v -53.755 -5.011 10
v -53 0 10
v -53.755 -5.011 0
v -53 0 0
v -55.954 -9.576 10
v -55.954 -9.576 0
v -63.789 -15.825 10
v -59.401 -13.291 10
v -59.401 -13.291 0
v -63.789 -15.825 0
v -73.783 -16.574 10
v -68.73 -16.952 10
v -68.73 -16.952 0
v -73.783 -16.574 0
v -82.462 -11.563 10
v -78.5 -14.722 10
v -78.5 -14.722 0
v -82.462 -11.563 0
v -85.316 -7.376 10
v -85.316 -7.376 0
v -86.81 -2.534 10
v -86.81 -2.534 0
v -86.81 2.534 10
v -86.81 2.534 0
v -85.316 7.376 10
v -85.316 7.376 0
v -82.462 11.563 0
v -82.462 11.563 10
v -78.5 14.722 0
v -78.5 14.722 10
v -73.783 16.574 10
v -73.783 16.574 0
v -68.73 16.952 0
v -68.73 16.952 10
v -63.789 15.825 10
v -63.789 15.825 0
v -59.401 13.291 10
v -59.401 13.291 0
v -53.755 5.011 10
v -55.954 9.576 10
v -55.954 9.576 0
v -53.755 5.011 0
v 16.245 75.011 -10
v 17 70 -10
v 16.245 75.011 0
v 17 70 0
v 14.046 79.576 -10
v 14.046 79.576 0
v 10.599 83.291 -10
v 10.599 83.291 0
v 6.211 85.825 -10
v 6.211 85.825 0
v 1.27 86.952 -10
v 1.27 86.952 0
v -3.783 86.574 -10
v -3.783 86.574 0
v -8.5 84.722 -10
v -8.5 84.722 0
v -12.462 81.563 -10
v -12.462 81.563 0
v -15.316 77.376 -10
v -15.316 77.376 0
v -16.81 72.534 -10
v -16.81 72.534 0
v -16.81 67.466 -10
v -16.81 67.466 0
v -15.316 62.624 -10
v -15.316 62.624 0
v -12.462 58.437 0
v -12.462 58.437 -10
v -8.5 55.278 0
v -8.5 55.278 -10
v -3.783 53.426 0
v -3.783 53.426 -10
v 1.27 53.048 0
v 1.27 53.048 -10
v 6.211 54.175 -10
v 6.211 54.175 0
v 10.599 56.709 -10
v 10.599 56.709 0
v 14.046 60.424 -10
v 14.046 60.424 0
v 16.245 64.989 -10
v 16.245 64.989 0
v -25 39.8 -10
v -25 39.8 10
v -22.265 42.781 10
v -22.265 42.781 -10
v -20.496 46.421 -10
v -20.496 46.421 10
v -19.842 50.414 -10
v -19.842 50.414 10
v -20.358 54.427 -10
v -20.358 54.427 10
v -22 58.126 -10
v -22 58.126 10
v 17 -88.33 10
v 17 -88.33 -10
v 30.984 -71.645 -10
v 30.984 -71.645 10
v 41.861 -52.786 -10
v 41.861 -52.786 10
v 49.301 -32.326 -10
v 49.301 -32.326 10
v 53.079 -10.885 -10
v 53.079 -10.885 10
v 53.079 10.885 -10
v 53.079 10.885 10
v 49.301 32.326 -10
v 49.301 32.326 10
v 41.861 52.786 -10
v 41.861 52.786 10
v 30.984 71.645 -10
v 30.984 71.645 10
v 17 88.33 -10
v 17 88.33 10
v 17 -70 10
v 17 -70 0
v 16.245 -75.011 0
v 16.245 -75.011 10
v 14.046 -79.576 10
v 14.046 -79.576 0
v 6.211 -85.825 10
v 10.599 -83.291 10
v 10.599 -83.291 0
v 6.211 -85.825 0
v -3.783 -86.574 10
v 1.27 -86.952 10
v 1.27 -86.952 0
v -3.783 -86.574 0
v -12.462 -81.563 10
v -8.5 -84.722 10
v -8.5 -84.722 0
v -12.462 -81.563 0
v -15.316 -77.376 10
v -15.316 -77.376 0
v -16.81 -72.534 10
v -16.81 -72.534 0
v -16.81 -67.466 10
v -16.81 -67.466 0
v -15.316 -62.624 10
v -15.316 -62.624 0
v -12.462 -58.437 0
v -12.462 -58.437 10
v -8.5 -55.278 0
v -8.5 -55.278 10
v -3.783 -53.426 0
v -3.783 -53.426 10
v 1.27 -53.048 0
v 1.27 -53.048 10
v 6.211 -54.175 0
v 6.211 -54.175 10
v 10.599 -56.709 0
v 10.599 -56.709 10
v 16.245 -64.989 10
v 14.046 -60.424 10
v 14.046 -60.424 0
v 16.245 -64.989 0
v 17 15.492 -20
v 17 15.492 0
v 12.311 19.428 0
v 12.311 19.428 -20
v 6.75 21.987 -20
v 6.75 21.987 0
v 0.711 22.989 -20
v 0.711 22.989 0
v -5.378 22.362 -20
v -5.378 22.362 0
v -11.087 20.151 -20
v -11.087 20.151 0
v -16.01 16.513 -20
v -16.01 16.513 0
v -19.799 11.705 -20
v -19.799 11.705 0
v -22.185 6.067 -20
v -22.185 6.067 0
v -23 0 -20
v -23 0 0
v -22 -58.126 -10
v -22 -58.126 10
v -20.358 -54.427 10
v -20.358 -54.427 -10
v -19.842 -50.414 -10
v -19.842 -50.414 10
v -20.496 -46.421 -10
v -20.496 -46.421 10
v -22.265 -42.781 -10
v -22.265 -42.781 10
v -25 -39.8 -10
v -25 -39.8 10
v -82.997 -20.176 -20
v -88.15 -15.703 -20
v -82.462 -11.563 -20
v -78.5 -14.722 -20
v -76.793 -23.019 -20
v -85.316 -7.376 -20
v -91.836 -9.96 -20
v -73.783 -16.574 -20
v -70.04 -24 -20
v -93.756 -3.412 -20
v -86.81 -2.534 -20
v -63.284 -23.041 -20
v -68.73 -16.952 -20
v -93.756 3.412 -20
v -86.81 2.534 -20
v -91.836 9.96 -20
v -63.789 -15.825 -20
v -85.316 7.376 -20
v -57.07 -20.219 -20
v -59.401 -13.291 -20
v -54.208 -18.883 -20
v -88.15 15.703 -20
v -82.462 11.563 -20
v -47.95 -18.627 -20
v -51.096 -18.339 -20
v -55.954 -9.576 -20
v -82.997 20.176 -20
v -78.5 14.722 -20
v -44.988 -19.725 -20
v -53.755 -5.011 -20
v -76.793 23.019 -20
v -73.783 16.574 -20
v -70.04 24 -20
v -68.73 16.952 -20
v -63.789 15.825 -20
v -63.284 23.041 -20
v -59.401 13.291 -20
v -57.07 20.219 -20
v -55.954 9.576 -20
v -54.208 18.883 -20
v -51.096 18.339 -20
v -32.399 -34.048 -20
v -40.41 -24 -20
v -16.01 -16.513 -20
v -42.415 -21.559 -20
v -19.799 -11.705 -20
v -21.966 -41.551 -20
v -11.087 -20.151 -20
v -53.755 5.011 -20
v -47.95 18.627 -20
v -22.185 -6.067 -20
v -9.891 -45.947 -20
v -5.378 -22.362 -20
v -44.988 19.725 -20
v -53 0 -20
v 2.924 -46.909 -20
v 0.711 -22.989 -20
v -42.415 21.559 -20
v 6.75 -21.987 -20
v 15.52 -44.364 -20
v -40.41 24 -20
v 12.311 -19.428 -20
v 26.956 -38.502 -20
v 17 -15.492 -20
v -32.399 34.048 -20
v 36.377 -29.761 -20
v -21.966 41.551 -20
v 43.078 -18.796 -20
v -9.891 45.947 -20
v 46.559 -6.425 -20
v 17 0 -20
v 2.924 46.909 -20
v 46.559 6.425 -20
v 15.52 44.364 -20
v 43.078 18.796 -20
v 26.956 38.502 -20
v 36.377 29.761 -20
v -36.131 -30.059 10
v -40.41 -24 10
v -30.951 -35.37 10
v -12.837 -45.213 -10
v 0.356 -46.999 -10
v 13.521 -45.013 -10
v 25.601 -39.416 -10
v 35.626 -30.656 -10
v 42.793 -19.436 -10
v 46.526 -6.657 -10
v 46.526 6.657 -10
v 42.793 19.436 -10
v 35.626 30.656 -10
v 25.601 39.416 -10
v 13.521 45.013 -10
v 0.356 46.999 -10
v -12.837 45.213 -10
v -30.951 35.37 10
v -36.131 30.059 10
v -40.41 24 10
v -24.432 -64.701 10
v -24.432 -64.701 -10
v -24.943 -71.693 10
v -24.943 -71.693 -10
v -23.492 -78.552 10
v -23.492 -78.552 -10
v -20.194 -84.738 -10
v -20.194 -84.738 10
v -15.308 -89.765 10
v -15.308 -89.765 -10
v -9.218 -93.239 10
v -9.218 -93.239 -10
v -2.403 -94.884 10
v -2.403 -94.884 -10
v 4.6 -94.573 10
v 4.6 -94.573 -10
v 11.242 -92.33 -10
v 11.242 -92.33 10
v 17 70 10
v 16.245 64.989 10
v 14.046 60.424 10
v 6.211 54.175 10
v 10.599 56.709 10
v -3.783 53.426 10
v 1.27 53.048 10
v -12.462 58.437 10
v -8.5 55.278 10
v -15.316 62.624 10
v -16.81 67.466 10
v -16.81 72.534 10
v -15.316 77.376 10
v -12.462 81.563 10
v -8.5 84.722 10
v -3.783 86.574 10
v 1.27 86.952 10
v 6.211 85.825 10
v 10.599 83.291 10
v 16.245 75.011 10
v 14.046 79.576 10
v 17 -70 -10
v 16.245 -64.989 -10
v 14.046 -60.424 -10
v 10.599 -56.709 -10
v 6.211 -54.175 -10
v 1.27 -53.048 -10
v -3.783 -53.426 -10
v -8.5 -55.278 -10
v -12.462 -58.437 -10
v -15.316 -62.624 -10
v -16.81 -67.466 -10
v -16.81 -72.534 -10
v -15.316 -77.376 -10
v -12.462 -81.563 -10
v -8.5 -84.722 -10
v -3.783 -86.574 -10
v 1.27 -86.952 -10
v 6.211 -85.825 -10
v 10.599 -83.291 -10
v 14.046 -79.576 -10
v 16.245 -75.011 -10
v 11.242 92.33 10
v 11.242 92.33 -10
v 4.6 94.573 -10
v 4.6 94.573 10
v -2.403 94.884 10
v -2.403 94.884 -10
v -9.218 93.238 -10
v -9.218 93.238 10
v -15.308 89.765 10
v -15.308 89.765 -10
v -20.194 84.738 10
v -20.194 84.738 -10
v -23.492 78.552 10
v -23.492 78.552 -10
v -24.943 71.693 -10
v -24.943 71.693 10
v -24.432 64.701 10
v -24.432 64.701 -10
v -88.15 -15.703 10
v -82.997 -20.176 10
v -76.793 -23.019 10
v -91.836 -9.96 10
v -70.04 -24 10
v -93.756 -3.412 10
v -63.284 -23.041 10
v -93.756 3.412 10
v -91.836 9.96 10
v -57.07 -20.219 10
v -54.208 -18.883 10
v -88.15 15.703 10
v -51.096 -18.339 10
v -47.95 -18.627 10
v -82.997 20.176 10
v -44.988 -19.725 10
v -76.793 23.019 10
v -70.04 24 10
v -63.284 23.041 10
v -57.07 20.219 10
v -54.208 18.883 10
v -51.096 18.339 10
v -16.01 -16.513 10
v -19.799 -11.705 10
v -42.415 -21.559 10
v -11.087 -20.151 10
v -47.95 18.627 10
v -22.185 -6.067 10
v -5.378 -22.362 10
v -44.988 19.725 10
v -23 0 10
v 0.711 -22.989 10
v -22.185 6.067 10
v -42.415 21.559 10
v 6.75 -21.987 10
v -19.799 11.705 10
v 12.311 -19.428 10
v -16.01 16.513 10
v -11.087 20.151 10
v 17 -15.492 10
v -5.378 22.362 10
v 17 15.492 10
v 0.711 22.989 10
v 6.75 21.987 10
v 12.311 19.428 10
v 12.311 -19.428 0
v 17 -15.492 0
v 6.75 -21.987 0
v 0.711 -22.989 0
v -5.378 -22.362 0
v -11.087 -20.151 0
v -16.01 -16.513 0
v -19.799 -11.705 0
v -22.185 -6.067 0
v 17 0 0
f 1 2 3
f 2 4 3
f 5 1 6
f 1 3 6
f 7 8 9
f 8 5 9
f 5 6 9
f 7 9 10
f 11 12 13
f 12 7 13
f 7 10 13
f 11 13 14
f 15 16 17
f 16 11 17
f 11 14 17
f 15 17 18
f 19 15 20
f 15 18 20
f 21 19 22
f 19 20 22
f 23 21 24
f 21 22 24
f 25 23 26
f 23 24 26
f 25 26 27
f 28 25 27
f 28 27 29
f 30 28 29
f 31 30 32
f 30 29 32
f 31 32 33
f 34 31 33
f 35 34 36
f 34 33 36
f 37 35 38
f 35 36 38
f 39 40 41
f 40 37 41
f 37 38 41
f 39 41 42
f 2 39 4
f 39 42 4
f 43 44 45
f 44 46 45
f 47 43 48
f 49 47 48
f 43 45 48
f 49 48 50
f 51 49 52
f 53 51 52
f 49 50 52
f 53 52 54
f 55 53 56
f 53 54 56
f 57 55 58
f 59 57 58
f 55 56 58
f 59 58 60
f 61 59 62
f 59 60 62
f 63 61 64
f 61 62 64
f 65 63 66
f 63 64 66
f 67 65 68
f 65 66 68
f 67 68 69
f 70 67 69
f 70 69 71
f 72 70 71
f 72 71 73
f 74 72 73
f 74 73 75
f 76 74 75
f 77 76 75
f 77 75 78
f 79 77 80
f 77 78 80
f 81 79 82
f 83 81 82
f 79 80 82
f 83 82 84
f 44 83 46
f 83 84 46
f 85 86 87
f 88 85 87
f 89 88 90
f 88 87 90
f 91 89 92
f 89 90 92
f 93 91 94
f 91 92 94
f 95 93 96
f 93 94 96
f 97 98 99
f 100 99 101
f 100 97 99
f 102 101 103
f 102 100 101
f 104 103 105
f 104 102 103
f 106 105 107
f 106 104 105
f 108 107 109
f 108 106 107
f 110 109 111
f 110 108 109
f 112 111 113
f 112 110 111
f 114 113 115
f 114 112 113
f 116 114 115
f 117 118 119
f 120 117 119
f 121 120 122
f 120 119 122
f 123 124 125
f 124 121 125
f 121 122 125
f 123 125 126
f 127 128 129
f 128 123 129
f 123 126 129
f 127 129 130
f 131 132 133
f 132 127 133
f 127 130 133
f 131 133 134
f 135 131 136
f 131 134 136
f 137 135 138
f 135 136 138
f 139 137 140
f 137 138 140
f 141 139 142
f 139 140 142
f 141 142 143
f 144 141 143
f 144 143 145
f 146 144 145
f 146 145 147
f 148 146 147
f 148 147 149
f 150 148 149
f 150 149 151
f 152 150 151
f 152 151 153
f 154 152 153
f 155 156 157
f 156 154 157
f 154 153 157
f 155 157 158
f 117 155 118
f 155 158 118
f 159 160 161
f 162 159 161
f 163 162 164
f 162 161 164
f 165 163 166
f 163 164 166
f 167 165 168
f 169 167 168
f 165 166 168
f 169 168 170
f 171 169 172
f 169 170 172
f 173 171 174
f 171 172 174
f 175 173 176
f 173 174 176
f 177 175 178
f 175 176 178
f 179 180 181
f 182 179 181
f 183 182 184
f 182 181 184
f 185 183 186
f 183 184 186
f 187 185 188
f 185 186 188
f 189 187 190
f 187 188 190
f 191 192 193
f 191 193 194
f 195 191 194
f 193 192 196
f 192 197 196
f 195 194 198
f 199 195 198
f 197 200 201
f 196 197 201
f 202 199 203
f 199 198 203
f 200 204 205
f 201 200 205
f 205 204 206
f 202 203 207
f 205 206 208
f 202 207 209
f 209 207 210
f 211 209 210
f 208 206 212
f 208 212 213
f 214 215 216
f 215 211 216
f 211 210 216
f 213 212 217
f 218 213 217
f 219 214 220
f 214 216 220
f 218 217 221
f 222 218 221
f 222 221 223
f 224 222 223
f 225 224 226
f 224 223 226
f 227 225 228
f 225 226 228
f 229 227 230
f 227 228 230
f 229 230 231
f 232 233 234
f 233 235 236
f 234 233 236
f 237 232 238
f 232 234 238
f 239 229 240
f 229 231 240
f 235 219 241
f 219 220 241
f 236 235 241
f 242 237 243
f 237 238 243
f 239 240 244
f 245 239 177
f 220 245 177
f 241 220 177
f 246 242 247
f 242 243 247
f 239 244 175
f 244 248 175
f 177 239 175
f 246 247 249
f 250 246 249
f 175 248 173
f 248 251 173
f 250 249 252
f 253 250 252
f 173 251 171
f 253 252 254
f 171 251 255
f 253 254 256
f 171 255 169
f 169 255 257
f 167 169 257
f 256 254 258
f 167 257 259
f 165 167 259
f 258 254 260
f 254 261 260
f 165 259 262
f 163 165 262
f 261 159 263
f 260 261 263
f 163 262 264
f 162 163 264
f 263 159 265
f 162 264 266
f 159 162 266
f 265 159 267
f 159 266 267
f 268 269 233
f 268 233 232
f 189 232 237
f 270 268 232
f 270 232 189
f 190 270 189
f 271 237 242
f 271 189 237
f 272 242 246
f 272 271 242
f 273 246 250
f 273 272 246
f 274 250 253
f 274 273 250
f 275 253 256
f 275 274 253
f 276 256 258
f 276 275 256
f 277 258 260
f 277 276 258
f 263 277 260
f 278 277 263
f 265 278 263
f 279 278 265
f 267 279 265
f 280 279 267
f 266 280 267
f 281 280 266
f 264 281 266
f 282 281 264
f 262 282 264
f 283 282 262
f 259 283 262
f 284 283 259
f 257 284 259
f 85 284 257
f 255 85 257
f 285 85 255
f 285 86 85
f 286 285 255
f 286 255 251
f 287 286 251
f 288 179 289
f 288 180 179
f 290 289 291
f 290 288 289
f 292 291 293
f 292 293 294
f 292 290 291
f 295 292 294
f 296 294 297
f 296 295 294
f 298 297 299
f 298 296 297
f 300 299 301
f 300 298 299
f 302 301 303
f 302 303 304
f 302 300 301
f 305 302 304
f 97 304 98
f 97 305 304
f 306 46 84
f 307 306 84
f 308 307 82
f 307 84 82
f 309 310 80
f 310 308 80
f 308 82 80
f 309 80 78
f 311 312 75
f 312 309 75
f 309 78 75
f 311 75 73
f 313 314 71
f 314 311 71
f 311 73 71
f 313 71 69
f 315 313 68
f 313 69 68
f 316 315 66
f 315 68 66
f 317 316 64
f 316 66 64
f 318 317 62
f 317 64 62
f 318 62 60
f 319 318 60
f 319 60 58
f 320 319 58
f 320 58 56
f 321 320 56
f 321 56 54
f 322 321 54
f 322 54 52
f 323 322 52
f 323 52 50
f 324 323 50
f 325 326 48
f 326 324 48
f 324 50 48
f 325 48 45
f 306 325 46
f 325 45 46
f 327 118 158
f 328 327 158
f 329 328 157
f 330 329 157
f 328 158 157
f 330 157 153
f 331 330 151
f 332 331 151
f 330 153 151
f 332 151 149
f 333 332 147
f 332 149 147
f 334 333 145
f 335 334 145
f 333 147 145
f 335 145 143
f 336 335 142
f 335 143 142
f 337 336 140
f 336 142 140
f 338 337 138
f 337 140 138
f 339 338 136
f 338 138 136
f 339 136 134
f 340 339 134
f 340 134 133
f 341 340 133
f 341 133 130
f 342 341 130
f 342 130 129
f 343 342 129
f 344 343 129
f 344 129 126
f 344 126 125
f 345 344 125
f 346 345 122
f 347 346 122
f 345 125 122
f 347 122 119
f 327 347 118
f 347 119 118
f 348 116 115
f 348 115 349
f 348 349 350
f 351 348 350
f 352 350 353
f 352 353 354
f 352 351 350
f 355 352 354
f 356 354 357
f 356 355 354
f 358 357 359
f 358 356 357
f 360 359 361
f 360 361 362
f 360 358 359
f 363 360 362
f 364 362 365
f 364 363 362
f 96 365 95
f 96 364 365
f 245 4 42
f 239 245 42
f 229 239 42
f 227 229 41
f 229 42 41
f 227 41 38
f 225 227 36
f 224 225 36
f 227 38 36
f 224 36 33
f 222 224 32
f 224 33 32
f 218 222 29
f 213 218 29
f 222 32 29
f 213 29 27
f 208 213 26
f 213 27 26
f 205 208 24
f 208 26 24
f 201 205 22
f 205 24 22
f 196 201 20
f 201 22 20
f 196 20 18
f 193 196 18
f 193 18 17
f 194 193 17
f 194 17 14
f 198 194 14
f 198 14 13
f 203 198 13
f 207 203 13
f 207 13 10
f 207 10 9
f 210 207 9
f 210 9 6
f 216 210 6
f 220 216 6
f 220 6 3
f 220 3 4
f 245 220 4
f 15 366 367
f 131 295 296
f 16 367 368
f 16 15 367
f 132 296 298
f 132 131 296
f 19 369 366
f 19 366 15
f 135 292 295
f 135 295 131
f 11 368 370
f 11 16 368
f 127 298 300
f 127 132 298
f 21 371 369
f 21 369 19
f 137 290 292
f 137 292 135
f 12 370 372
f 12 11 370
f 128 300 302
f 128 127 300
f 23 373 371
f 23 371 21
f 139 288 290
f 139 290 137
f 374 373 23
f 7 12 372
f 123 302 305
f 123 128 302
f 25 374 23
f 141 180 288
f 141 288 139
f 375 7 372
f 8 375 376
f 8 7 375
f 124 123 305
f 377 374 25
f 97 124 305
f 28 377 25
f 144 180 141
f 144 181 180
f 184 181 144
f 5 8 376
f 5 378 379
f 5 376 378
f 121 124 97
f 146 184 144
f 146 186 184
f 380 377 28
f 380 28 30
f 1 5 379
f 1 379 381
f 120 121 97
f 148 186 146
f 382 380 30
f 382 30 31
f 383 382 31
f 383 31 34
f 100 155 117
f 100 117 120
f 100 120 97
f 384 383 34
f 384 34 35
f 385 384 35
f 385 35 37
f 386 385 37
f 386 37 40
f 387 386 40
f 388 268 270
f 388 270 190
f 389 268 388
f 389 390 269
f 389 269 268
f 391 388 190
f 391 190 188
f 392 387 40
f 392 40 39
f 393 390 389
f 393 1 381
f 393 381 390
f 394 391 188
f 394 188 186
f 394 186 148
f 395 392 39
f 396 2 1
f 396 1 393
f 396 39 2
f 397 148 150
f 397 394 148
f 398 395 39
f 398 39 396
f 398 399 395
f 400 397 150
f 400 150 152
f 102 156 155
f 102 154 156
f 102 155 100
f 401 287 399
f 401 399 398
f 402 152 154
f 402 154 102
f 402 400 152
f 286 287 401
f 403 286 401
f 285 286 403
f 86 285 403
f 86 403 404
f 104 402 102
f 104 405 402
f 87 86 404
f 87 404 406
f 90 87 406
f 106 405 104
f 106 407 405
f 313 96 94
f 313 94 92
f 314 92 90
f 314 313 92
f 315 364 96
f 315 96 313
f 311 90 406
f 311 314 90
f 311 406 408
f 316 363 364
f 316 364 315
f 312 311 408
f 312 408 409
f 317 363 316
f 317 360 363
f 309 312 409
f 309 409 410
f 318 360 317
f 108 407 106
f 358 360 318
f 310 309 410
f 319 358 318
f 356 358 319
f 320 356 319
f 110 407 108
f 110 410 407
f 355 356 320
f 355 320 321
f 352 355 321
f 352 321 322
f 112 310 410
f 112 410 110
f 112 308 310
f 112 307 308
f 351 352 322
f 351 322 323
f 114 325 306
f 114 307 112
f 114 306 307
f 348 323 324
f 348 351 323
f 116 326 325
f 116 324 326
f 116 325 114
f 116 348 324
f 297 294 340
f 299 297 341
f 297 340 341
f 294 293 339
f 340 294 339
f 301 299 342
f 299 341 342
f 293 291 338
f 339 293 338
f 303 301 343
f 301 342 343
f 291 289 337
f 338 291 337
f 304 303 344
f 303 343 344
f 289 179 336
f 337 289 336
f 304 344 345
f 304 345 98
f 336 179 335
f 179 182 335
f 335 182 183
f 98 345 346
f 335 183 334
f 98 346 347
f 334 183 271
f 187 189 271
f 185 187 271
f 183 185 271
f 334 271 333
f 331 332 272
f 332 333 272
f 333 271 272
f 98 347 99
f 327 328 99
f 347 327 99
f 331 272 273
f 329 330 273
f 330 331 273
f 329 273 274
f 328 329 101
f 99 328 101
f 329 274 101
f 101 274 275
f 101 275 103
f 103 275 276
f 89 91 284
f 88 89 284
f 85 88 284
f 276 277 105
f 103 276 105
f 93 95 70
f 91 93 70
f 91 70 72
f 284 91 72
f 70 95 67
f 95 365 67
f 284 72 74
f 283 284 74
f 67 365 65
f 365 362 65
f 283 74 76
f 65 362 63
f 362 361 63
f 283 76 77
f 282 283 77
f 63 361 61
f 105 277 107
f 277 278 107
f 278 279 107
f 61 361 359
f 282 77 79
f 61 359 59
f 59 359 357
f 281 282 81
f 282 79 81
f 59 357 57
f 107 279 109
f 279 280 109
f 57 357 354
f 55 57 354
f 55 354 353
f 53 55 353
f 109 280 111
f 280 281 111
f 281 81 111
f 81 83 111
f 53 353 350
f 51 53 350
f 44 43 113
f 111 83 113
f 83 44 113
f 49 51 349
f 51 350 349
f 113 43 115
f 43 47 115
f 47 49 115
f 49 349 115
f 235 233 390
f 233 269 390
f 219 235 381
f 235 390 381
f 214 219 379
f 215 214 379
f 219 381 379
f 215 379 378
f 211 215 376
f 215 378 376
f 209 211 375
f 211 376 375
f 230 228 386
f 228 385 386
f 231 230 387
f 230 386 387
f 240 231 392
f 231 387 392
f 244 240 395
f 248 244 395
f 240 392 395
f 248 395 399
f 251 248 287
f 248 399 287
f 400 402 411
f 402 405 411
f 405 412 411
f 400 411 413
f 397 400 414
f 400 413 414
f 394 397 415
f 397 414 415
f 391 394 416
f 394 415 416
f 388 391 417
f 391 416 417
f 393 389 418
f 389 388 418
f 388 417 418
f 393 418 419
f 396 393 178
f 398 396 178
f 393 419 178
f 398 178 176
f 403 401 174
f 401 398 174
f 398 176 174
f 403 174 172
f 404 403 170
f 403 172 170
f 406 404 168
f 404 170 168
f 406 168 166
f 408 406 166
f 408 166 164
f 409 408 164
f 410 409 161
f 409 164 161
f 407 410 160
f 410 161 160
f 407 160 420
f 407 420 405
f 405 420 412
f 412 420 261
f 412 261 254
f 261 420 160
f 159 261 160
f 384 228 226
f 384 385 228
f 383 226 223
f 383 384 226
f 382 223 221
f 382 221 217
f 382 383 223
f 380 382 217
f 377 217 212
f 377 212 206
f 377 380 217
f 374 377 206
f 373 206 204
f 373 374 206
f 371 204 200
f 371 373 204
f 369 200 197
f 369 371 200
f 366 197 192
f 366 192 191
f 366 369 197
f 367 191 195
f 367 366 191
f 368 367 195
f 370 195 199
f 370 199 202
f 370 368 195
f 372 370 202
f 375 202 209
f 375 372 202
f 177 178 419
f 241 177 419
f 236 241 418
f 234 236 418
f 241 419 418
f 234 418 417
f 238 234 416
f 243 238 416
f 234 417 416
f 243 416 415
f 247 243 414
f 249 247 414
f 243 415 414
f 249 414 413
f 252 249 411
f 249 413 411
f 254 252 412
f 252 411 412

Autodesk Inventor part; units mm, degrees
ref_plane "YZ Plane" through (0, 0, 0) normal (1, 0, 0) x (0, 1, 0)
ref_plane "XZ Plane" through (0, 0, 0) normal (0, 1, 0) x (-1, 0, 0)
ref_plane "XY Plane" through (0, 0, 0) normal (0, 0, 1) x (1, 0, 0)
sketch "Эскиз1" plane through (0, 0, 0) normal (0, 0, 1) x (1, 0, 0)
  arc A0 (17, 15.4919) -> (17, -15.4919) centre (0, 0) ccw
  arc A1 (-40.4104, -24) -> (-40.4104, 24) centre (0, 0) ccw
  circle A2 centre (0, -70) radius 17
  circle A3 centre (0, 70) radius 17
  line L0 (0, 0) -> (-70, 0)
  arc A4 (-57.0704, 20.2194) -> (-57.0704, -20.2194) centre (-70, 0) ccw
  circle A5 centre (-70, 0) radius 17
  arc A6 (-57.0704, 20.2194) -> (-40.4104, 24) centre (-50.6056, 30.3291) ccw
  arc A7 (-40.4104, -24) -> (-57.0704, -20.2194) centre (-50.6056, -30.3291) ccw
  arc A8 (-22, -58.1257) -> (-25, -39.7995) centre (-33.8403, -50.6553) ccw
  arc A9 (-25, 39.7995) -> (-22, 58.1257) centre (-33.8403, 50.6553) ccw
  line L1 (0, 0) -> (17, 0)
  line L2 (17, 0) -> (17, -15.4919)
  line L3 (17, 0) -> (17, 15.4919)
  arc A10 (17, -88.3303) -> (17, 88.3303) centre (-71.4464, 0) ccw
  arc A11 (-21.3952, -57.0676) -> (18.6741, -86.6216) centre (0, -70) ccw
  arc A12 (18.6741, 86.6216) -> (-21.3952, 57.0676) centre (0, 70) ccw
  dimension "d0" = 46
  dimension "d1" = 94
  dimension "d2" = 70
  dimension "d5" = 34
  dimension "d6" = 34
  dimension "d10" = 48
  dimension "d11" = 34
  dimension "d12" = 12
  dimension "d13" = 12
  dimension "d14" = 14
  dimension "d15" = 14
  dimension "d17" = 17
  dimension "d18" = 125
  dimension "d19" = 140
  dimension "d20" = 25
  dimension "d21" = 1.6741
  dimension "d22" = 86.6216
  dimension "d23" = 1.6741
  dimension "d24" = 38.3952
  dimension "d25" = 38.3952
  dimension "d26" = 39
  dimension "d27" = 39
  dimension "d28" = 57.4104
  dimension "d29" = 57.4104
extrude "Выдавливание1" add sketch "Эскиз1" along normal blind 10 contours A7 A4 A6 A1 | A1 A9 A12 A10 A11 A8
sketch "Эскиз2" plane through (0, 0, 10) normal (0, 0, 1) x (1, 0, 0)
  point P0 (0, 0)
extrude "Выдавливание4" add sketch "Эскиз1" against normal blind 10 contours A1 A9 A12 A10 A11 A8
extrude "Выдавливание5" add sketch "Эскиз1" against normal blind 20 contours A7 A4 A6 A1
properties part number "zad6.5-1"
